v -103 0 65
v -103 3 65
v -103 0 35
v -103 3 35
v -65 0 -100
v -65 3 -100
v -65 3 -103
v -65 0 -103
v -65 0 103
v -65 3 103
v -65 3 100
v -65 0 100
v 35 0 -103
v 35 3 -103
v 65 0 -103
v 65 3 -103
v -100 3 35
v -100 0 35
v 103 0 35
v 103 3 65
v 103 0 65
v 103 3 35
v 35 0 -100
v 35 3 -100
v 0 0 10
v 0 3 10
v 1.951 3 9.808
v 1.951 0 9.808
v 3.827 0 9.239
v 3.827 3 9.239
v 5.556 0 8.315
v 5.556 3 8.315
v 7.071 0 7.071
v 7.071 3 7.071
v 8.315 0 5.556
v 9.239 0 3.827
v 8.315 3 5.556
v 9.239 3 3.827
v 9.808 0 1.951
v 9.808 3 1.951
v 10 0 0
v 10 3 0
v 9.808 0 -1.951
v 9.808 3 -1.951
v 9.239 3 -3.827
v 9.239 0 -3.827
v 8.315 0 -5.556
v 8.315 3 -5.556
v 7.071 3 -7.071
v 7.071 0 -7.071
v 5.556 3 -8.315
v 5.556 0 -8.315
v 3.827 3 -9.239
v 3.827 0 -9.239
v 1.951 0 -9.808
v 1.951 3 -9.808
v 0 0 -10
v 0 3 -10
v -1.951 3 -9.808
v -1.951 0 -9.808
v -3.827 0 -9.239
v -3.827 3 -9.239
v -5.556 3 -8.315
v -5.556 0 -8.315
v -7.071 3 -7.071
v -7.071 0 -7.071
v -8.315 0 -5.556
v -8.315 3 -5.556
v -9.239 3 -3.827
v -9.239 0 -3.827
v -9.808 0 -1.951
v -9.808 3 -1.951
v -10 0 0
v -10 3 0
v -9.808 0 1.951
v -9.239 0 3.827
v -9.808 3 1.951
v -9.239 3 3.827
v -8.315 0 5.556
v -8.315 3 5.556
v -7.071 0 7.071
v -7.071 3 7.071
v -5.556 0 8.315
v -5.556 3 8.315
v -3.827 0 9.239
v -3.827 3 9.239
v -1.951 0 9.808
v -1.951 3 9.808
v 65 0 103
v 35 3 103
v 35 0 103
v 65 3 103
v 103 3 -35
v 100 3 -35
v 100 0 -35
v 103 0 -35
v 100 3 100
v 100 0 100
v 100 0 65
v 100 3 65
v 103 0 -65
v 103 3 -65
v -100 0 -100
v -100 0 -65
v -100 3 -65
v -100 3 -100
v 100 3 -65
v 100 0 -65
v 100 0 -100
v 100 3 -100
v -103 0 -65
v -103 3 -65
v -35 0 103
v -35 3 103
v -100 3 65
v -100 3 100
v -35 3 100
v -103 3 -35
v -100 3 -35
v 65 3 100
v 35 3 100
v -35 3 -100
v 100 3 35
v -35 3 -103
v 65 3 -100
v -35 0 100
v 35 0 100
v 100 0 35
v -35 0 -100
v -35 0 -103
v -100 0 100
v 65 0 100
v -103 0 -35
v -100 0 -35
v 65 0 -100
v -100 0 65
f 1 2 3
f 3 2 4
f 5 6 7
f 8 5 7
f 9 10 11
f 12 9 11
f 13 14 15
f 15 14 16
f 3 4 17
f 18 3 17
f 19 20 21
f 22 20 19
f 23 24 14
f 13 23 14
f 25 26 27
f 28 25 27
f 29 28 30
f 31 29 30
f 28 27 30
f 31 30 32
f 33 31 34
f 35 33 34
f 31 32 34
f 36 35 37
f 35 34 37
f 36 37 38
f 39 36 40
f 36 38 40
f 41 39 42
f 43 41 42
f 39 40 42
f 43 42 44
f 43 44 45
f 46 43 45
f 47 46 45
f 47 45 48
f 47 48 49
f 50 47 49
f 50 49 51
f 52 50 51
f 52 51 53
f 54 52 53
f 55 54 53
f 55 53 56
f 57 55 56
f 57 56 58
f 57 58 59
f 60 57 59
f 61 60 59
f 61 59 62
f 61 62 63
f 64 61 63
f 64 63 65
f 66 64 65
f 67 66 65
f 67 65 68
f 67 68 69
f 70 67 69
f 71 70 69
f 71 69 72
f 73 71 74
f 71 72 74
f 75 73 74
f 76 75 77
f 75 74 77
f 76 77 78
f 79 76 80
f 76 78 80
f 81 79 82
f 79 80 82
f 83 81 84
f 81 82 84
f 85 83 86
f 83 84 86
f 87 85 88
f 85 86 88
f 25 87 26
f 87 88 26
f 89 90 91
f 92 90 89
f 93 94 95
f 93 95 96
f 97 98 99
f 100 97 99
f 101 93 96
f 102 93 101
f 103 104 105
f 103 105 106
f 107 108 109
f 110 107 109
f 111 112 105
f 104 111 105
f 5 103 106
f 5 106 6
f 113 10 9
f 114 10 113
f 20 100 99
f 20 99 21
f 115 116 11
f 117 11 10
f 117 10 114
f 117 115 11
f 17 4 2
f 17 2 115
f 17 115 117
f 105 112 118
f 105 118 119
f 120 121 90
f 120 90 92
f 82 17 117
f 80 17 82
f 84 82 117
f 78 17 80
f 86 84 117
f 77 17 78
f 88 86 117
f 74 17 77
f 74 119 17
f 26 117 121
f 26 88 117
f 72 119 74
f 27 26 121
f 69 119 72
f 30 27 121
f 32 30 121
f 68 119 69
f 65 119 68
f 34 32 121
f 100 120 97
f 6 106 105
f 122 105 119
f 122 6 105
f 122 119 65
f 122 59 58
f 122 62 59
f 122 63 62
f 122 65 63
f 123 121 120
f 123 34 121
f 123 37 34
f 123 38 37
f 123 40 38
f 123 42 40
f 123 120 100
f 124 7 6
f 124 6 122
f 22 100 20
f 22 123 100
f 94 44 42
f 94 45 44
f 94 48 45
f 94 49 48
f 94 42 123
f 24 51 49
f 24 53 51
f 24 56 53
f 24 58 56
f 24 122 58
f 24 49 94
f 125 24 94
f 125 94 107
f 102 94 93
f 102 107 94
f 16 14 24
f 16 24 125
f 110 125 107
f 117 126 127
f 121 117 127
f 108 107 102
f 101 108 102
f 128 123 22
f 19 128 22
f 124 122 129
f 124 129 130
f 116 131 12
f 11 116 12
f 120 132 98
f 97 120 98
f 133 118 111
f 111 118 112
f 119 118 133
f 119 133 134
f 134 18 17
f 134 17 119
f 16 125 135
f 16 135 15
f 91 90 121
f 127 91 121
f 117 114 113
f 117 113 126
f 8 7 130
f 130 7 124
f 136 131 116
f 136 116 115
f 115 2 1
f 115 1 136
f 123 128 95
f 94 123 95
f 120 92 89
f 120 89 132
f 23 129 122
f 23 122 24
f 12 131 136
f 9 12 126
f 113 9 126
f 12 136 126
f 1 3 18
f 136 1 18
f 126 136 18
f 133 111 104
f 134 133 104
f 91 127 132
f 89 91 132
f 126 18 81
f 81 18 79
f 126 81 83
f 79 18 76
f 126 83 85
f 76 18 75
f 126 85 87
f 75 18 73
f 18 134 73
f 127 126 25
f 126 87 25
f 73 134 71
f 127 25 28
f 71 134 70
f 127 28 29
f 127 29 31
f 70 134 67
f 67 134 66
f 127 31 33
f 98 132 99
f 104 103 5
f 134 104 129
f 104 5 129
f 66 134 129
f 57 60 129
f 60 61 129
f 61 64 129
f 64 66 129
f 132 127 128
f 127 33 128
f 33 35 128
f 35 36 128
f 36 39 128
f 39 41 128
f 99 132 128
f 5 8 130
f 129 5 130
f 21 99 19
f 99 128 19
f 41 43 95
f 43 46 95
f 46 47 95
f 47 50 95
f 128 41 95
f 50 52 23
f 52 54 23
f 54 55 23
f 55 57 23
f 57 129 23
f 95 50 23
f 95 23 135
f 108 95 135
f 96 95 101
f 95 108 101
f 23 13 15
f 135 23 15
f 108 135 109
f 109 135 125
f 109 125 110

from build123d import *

# Parameters (mm, degrees)
SKETCH1_W           = 200
SKETCH1_H           = 200
BOSS_EXTRUDE1_DEPTH = 3
SKETCH2_R           = 10
CUT_EXTRUDE1_DEPTH  = 10
SKETCH3_W           = 3
SKETCH3_H           = 30
SKETCH3_W_2         = 30
SKETCH3_H_2         = 3
BOSS_EXTRUDE2_DEPTH = 3


with BuildPart() as part:
    # Sketch1 → Boss-Extrude1 (new body)
    with BuildSketch(Plane(origin=(0, 0, 0), x_dir=(1, 0, 0), z_dir=(0, 1, 0))):
        Rectangle(SKETCH1_W, SKETCH1_H)
    extrude(amount=BOSS_EXTRUDE1_DEPTH)

    # Sketch2 → Cut-Extrude1 (cut)
    with BuildSketch(Plane(origin=(0, 3, 0), x_dir=(1, 0, 0), z_dir=(0, 1, 0))):
        with Locations(Location((0, 0, 0), (0, 0, 270))):
            Circle(SKETCH2_R)
    extrude(amount=-CUT_EXTRUDE1_DEPTH, mode=Mode.SUBTRACT)

    # Sketch3 → Boss-Extrude2 (add)
    with BuildSketch(Plane(origin=(0, 3, 0), x_dir=(1, 0, 0), z_dir=(0, 1, 0))):
        with Locations((101.5, 50)):
            Rectangle(SKETCH3_W, SKETCH3_H)
        with Locations((101.5, -50)):
            Rectangle(SKETCH3_W, SKETCH3_H)
        with Locations((50, -101.5)):
            Rectangle(SKETCH3_W_2, SKETCH3_H_2)
        with Locations((-50, -101.5)):
            Rectangle(SKETCH3_W_2, SKETCH3_H_2)
        with Locations((-101.5, -50)):
            Rectangle(SKETCH3_W, SKETCH3_H)
        with Locations((-101.5, 50)):
            Rectangle(SKETCH3_W, SKETCH3_H)
        with Locations((-50, 101.5)):
            Rectangle(SKETCH3_W_2, SKETCH3_H_2)
        with Locations((50, 101.5)):
            Rectangle(SKETCH3_W_2, SKETCH3_H_2)
    extrude(amount=-BOSS_EXTRUDE2_DEPTH)


solid = part.part
